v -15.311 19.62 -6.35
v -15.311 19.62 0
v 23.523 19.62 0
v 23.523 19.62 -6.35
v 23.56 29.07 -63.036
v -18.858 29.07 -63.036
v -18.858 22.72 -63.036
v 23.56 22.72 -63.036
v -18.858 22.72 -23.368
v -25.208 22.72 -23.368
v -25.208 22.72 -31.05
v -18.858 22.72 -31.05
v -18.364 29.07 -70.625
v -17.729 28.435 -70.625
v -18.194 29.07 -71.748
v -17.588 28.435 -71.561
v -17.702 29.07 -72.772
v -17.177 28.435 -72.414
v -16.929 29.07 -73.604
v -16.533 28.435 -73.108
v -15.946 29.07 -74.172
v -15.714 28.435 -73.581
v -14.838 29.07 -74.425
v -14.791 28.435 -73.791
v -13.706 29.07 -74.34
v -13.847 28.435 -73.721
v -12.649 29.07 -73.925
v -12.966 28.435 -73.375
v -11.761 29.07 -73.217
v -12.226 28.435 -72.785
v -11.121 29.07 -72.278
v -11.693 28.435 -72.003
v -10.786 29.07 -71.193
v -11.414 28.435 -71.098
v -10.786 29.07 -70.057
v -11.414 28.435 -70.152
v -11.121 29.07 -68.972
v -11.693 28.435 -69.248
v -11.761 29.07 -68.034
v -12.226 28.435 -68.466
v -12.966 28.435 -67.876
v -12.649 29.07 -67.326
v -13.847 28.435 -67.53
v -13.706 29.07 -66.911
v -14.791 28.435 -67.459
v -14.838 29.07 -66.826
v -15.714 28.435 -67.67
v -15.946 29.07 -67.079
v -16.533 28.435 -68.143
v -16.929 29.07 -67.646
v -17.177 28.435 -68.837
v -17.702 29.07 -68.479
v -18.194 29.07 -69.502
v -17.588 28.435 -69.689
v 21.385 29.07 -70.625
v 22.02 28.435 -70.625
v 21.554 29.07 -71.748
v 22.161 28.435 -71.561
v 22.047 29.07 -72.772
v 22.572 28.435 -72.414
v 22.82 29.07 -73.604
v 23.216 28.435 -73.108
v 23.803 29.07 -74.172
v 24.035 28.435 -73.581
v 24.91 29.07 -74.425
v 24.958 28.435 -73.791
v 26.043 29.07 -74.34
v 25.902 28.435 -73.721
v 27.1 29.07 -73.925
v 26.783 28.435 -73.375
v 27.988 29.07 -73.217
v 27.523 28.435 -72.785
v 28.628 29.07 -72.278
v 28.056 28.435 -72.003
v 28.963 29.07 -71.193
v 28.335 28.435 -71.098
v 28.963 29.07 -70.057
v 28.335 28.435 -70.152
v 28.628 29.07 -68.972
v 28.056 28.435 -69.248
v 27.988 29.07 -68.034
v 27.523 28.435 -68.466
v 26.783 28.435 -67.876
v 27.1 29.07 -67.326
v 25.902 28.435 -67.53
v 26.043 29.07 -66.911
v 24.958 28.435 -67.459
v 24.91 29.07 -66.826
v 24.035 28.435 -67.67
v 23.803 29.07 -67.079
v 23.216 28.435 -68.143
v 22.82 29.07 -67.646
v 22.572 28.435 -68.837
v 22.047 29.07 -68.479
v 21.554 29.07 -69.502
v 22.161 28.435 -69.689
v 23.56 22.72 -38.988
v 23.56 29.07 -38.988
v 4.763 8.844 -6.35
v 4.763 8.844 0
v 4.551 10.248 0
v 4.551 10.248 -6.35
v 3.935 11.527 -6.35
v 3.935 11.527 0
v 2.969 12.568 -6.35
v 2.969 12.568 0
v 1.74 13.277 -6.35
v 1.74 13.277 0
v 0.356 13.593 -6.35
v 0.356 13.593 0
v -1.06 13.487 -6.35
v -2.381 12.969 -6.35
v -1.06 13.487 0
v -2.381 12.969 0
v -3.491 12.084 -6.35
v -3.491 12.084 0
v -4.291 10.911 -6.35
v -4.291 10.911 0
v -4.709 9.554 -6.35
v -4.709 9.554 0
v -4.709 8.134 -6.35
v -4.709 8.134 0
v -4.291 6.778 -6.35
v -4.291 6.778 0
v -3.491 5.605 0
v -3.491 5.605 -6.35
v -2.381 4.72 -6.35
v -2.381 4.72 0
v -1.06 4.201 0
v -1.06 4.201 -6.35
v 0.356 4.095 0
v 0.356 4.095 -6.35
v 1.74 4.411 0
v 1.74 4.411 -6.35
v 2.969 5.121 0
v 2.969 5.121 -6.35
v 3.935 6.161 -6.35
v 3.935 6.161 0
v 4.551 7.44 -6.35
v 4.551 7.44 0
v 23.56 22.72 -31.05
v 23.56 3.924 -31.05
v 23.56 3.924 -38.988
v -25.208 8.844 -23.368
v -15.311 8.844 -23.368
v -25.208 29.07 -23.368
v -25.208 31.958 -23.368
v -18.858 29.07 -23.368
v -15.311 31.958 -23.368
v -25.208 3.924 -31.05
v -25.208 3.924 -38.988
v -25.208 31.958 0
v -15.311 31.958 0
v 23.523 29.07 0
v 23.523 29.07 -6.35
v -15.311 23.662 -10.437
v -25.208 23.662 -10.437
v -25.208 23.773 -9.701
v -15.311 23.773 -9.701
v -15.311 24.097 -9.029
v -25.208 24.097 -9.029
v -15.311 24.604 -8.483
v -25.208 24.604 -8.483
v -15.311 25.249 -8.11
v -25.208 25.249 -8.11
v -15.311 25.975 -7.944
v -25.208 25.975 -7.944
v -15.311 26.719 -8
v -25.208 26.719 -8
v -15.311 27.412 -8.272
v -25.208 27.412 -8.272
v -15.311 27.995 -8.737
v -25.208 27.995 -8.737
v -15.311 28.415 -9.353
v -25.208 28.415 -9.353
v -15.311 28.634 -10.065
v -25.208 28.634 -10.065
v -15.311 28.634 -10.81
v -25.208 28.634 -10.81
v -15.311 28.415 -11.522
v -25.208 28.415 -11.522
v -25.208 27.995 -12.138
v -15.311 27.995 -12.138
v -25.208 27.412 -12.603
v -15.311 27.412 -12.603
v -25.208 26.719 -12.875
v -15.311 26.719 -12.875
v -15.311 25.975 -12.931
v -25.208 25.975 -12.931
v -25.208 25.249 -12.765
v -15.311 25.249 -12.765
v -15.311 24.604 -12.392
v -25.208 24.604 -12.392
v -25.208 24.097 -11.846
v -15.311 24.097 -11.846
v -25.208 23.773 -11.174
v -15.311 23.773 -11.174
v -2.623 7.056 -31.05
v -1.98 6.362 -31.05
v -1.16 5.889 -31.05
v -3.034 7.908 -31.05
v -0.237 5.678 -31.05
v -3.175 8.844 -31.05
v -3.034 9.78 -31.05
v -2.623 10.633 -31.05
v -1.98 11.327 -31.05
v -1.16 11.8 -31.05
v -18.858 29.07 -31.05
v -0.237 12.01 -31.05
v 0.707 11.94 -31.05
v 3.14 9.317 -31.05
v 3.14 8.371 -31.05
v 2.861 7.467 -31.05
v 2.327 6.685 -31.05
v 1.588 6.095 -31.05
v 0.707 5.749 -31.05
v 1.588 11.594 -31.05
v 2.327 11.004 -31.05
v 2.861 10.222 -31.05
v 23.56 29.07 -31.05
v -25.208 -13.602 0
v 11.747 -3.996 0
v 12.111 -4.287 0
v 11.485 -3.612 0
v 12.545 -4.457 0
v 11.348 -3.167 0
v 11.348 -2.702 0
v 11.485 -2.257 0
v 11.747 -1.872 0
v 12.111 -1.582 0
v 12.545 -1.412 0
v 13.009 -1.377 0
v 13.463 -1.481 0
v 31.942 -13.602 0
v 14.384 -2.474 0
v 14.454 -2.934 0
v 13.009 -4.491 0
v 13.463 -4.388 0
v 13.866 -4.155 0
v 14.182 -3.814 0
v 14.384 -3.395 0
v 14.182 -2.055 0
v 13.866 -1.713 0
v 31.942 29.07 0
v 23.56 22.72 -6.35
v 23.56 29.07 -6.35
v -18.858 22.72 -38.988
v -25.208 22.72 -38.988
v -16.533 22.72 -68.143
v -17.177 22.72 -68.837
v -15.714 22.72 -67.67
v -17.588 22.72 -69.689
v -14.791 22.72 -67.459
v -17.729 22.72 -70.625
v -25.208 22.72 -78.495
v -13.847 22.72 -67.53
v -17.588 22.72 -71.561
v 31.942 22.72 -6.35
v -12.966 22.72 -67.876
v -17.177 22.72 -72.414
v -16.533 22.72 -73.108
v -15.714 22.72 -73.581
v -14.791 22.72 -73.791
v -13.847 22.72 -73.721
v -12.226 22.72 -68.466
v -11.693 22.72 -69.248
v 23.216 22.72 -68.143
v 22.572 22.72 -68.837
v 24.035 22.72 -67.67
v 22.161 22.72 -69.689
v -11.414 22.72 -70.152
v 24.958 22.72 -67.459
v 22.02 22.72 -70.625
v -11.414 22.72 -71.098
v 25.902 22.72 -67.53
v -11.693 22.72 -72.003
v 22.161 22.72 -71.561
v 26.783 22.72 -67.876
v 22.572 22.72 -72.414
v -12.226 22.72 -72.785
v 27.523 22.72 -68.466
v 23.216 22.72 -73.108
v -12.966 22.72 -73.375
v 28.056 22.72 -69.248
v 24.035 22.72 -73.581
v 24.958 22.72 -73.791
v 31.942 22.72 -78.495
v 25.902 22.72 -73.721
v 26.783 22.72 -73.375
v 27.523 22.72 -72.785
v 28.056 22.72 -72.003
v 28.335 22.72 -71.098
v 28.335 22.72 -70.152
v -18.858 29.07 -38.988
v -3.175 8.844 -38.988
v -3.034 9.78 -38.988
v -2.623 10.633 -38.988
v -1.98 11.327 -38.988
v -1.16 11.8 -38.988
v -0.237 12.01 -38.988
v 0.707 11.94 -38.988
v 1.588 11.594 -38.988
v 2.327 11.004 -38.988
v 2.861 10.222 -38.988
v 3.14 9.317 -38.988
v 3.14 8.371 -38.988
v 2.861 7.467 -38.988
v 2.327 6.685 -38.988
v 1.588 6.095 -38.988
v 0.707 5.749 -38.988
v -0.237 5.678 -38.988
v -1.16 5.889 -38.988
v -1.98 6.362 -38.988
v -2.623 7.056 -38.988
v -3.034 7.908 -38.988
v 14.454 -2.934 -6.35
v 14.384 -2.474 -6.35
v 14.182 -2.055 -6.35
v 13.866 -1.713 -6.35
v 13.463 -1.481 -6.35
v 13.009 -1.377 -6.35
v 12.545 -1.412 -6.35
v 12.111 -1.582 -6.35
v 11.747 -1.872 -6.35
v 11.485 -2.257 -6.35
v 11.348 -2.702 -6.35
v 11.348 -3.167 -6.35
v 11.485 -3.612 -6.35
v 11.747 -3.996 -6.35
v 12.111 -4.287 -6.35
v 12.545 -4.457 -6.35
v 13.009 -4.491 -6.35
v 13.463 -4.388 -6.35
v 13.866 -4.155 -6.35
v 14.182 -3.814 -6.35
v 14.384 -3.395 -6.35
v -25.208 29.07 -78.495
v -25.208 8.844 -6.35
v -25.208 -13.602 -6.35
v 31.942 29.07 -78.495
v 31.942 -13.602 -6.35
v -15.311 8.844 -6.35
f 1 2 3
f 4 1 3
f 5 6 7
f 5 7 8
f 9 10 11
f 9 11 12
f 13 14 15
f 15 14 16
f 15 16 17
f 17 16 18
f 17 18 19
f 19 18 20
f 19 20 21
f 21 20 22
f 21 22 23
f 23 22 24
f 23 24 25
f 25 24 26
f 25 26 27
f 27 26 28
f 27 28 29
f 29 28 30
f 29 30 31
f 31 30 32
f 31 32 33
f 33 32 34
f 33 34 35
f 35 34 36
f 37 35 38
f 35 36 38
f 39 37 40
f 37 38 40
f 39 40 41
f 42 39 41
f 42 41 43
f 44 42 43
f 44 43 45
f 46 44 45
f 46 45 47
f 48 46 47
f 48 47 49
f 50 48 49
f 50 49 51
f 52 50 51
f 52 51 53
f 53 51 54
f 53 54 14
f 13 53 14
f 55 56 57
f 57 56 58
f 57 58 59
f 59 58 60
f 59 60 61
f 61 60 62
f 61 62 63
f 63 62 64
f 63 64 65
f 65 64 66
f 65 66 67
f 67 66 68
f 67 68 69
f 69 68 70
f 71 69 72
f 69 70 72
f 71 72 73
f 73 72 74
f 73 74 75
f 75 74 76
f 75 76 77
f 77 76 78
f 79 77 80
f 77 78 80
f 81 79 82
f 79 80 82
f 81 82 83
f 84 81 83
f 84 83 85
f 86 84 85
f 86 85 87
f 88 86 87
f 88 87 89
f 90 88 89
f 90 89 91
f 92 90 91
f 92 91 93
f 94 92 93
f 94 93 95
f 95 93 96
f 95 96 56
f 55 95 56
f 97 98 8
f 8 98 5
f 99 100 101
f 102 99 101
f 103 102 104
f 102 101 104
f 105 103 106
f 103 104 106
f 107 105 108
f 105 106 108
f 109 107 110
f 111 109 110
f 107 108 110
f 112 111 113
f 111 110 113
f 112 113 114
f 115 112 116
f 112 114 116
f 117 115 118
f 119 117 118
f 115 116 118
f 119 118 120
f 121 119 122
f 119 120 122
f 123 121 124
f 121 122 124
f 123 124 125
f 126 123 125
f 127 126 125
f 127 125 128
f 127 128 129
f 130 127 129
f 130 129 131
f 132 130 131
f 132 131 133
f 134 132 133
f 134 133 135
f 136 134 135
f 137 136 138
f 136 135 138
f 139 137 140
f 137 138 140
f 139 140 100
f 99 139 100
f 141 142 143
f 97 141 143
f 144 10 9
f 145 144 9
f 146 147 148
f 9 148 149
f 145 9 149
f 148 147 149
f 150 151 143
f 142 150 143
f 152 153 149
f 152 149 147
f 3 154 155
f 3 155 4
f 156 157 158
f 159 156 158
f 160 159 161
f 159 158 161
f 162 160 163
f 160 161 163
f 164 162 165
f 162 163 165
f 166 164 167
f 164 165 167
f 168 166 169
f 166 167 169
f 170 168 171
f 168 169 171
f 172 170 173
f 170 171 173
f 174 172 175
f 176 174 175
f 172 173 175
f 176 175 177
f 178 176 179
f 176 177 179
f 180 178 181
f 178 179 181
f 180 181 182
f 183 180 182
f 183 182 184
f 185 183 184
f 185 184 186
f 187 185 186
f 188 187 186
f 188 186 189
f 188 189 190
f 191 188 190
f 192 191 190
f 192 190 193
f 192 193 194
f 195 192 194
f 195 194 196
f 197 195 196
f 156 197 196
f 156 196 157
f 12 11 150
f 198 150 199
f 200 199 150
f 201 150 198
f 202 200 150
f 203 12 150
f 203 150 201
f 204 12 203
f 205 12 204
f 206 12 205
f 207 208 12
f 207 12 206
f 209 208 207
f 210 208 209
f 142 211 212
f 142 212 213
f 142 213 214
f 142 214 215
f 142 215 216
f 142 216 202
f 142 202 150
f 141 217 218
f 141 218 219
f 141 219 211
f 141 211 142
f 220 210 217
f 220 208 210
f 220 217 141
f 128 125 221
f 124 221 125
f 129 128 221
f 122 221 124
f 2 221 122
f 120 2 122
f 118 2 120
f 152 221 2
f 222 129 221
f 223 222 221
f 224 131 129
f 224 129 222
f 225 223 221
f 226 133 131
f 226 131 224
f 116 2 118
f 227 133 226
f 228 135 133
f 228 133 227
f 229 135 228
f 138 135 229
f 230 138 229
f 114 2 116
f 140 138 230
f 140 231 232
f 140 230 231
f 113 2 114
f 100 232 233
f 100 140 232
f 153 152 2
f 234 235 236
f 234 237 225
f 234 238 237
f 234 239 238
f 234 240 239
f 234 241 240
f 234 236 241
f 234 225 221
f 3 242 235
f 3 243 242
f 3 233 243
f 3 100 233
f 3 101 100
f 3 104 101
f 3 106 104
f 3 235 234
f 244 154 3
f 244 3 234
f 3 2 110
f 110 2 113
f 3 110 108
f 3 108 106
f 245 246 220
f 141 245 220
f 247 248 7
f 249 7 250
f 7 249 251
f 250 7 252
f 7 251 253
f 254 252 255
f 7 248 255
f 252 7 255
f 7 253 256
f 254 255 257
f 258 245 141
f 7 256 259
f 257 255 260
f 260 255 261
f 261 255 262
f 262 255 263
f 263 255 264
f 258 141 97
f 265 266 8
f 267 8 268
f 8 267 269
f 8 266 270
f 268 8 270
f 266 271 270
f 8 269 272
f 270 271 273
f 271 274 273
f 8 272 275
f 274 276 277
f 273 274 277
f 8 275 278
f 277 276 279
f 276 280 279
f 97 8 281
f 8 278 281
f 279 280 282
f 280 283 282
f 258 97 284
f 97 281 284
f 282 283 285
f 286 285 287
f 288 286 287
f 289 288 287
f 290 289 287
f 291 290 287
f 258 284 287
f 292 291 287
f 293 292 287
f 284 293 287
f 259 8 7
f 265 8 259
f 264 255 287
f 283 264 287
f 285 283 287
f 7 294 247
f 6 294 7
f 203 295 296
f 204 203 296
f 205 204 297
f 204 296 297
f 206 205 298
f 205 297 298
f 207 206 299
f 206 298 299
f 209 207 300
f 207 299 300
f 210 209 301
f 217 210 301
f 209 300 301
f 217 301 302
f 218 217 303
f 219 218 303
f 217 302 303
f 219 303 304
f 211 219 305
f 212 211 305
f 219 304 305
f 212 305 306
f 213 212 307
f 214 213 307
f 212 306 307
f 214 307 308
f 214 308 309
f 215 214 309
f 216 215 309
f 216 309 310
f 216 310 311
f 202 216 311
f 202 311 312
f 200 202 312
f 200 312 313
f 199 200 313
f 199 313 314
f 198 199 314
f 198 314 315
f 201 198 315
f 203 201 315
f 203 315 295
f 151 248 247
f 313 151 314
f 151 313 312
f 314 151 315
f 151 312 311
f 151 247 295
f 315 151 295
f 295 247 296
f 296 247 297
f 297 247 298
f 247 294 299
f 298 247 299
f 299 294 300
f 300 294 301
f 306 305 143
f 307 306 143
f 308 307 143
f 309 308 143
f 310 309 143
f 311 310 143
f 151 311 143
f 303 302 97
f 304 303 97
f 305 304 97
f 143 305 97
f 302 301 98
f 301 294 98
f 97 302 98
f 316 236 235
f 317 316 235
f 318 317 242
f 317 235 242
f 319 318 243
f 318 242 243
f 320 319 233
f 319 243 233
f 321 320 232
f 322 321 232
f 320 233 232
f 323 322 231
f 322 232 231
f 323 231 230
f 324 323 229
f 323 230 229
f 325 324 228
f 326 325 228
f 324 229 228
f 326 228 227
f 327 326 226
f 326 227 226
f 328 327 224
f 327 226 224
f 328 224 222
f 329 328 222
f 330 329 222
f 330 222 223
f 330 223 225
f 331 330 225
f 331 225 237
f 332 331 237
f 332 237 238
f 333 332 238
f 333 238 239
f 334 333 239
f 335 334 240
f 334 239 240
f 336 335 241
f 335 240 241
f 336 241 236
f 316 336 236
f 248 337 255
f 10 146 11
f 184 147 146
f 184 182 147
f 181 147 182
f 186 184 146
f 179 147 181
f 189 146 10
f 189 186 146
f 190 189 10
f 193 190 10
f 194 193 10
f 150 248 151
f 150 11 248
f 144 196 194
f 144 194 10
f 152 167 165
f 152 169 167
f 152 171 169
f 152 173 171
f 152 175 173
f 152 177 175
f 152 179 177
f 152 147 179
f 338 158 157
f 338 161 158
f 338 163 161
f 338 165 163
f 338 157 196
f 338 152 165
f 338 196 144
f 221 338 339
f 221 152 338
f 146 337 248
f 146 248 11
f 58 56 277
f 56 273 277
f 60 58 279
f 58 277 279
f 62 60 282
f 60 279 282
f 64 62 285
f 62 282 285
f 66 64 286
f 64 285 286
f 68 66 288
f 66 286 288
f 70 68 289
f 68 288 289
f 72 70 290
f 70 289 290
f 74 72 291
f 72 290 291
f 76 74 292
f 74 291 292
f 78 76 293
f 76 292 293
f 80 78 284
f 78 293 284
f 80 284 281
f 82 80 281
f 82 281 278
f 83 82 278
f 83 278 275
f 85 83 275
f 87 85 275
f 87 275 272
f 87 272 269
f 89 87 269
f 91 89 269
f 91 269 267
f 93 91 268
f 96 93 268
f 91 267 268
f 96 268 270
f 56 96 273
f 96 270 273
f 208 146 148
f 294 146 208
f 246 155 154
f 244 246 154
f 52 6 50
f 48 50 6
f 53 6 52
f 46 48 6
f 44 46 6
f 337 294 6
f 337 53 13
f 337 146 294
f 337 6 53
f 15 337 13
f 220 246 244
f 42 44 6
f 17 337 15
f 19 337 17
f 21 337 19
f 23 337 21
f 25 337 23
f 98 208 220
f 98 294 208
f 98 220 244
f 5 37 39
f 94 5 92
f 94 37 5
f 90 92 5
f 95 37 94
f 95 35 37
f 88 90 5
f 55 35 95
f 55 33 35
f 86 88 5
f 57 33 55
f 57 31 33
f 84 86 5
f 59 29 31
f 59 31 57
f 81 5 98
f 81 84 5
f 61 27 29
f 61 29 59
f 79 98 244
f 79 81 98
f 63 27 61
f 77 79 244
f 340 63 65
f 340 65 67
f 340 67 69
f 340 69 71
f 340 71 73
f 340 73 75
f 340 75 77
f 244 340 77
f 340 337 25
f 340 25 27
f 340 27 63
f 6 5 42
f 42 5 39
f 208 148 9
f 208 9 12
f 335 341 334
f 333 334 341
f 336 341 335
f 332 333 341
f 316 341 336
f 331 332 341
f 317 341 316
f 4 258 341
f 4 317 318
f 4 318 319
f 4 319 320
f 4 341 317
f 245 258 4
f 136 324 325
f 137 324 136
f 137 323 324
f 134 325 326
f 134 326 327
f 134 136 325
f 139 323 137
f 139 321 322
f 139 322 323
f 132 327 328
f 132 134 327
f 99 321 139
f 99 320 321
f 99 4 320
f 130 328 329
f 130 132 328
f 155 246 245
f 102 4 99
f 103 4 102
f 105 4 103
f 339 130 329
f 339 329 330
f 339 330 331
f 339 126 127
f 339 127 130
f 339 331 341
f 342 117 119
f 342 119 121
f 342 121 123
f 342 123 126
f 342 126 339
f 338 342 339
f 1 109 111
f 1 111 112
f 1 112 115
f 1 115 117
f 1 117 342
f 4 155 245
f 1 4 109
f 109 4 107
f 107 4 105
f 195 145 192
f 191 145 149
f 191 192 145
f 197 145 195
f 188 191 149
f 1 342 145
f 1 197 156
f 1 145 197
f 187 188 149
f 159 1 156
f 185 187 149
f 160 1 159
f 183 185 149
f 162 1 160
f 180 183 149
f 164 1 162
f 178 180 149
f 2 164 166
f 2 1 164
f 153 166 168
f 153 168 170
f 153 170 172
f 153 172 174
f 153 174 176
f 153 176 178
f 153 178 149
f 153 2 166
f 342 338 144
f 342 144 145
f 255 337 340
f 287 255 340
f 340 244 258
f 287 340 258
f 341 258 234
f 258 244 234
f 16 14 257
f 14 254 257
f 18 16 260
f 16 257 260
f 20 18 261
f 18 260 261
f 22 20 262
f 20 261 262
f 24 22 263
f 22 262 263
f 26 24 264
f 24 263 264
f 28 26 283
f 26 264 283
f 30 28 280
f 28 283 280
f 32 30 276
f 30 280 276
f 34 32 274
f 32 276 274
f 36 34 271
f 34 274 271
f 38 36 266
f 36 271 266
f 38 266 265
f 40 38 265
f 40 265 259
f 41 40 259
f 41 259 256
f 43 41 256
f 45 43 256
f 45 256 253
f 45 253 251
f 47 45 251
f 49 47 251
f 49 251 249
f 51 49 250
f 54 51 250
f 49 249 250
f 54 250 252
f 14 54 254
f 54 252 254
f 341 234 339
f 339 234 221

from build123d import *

# Parameters (mm, degrees)
SKETCH1_R                             = 1.561475409
SKETCH1_R_2                           = 4.762499999
BOSS_EXTRUDE1_DEPTH                   = 6.35
BOSS_EXTRUDE2_DEPTH                   = 23.368
SKETCH3_W                             = 6.35
SKETCH3_H                             = 76.2
SKETCH3_W_2                           = 8.382
BOSS_EXTRUDE3_DEPTH                   = 6.35
CUT_EXTRUDE1_REACH                    = 102.468
SKETCH4_R                             = 2.5
SKETCH5_W                             = 57.15
SKETCH5_H                             = 15.458350333
BOSS_EXTRUDE4_DEPTH                   = 6.35
F_1_4_0_25_DIAMETER_HOLE1_D           = 6.35
F_1_4_0_25_DIAMETER_HOLE1_CSINK_D     = 7.62
F_1_4_0_25_DIAMETER_HOLE1_CSINK_ANGLE = 90
SKETCH8_W                             = 48.768
SKETCH8_H                             = 7.9375
BOSS_EXTRUDE5_DEPTH                   = 25.146
CUT_EXTRUDE2_REACH                    = 62.02
SKETCH10_R                            = 3.175


with BuildPart() as part:
    # Sketch1 → Boss-Extrude1 (new body)
    with BuildSketch(Plane.XY):
        Polygon((23.52260518, 29.069744957), (31.942128684, 29.069744957), (31.942128684, -13.602255043), (-25.207871316, -13.602255043), (-25.207871316, 8.844196721), (-25.207871316, 31.958196721), (-18.857871316, 31.958196721), (-15.310946905, 31.958196721), (-15.310946905, 22.656471706), (-15.310946905, 19.620299994), (23.52260518, 19.620299994), (23.52260518, 22.656471706), align=None)
        with Locations((12.892128684, -2.934255043)):
            Circle(SKETCH1_R, mode=Mode.SUBTRACT)
        with Locations((6.7e-08, 8.844196721)):
            Circle(SKETCH1_R_2, mode=Mode.SUBTRACT)
    extrude(amount=-BOSS_EXTRUDE1_DEPTH)

    # Sketch2 → Boss-Extrude2 (add)
    with BuildSketch(Plane.XY):
        Polygon((-15.310946905, 31.958196721), (-18.857871316, 31.958196721), (-25.207871316, 31.958196721), (-25.207871316, 8.844196721), (-18.857871316, 8.844196721), (-15.310946905, 8.844196721), (-15.310946905, 19.620299994), align=None)
    extrude(amount=-BOSS_EXTRUDE2_DEPTH)

    # Sketch3 → Boss-Extrude3 (add)
    with BuildSketch(Plane(origin=(0, 29.069744957, 0), x_dir=(1, 0, 0), z_dir=(0, 1, 0))):
        with Locations((-22.032871316, 38.1)):
            Rectangle(SKETCH3_W, SKETCH3_H)
        with Locations((27.751128684, 38.1)):
            Rectangle(SKETCH3_W_2, SKETCH3_H)
    extrude(amount=-BOSS_EXTRUDE3_DEPTH)

    # Sketch4 → Cut-Extrude1 (cut, up to next)
    with BuildSketch(Plane.ZY.offset(25.207871316), mode=Mode.PRIVATE) as cut_extrude1_sk1:
        with Locations(Location((-10.437499124, 26.162307082, 0), (0, 0, 270))):
            Circle(SKETCH4_R)
    cut_extrude1_tool1 = extrude(cut_extrude1_sk1.sketch, amount=-CUT_EXTRUDE1_REACH, mode=Mode.PRIVATE) & part.part
    add(cut_extrude1_tool1.solids().sort_by_distance((-25.207871, 26.162307, -10.437499))[0], mode=Mode.SUBTRACT)

    # Sketch5 → Boss-Extrude4 (add)
    with BuildSketch(Plane(origin=(0, 29.069744957, 0), x_dir=(1, 0, 0), z_dir=(0, 1, 0))):
        with Locations((3.367128684, 70.765431119)):
            Rectangle(SKETCH5_W, SKETCH5_H)
    extrude(amount=-BOSS_EXTRUDE4_DEPTH)

    # 1/4 (0.25) Diameter Hole1 (through all)
    with Locations(Plane(origin=(0, 29.069744957, 0), x_dir=(1, 0, 0), z_dir=(0, 1, 0))):
        with Locations((-14.553595262, 70.62526945), (25.19519669, 70.62526945)):
            CounterSinkHole(F_1_4_0_25_DIAMETER_HOLE1_D / 2, F_1_4_0_25_DIAMETER_HOLE1_CSINK_D / 2, counter_sink_angle=F_1_4_0_25_DIAMETER_HOLE1_CSINK_ANGLE)

    # Sketch8 → Boss-Extrude5 (add)
    with BuildSketch(Plane(origin=(0, 29.069744957, 0), x_dir=(1, 0, 0), z_dir=(0, 1, 0))):
        with Locations((-0.823871316, 35.01875)):
            Rectangle(SKETCH8_W, SKETCH8_H)
    extrude(amount=-BOSS_EXTRUDE5_DEPTH)

    # Sketch10 → Cut-Extrude2 (cut, up to next)
    with BuildSketch(Plane(origin=(0, 0, -38.9875), x_dir=(-1, 0, 0), z_dir=(0, 0, -1)), mode=Mode.PRIVATE) as cut_extrude2_sk1:
        with Locations((-6.7e-08, 8.844196721)):
            Circle(SKETCH10_R)
    cut_extrude2_tool1 = extrude(cut_extrude2_sk1.sketch, amount=-CUT_EXTRUDE2_REACH, mode=Mode.PRIVATE) & part.part
    add(cut_extrude2_tool1.solids().sort_by_distance((0, 8.844197, -38.9875))[0], mode=Mode.SUBTRACT)


solid = part.part
